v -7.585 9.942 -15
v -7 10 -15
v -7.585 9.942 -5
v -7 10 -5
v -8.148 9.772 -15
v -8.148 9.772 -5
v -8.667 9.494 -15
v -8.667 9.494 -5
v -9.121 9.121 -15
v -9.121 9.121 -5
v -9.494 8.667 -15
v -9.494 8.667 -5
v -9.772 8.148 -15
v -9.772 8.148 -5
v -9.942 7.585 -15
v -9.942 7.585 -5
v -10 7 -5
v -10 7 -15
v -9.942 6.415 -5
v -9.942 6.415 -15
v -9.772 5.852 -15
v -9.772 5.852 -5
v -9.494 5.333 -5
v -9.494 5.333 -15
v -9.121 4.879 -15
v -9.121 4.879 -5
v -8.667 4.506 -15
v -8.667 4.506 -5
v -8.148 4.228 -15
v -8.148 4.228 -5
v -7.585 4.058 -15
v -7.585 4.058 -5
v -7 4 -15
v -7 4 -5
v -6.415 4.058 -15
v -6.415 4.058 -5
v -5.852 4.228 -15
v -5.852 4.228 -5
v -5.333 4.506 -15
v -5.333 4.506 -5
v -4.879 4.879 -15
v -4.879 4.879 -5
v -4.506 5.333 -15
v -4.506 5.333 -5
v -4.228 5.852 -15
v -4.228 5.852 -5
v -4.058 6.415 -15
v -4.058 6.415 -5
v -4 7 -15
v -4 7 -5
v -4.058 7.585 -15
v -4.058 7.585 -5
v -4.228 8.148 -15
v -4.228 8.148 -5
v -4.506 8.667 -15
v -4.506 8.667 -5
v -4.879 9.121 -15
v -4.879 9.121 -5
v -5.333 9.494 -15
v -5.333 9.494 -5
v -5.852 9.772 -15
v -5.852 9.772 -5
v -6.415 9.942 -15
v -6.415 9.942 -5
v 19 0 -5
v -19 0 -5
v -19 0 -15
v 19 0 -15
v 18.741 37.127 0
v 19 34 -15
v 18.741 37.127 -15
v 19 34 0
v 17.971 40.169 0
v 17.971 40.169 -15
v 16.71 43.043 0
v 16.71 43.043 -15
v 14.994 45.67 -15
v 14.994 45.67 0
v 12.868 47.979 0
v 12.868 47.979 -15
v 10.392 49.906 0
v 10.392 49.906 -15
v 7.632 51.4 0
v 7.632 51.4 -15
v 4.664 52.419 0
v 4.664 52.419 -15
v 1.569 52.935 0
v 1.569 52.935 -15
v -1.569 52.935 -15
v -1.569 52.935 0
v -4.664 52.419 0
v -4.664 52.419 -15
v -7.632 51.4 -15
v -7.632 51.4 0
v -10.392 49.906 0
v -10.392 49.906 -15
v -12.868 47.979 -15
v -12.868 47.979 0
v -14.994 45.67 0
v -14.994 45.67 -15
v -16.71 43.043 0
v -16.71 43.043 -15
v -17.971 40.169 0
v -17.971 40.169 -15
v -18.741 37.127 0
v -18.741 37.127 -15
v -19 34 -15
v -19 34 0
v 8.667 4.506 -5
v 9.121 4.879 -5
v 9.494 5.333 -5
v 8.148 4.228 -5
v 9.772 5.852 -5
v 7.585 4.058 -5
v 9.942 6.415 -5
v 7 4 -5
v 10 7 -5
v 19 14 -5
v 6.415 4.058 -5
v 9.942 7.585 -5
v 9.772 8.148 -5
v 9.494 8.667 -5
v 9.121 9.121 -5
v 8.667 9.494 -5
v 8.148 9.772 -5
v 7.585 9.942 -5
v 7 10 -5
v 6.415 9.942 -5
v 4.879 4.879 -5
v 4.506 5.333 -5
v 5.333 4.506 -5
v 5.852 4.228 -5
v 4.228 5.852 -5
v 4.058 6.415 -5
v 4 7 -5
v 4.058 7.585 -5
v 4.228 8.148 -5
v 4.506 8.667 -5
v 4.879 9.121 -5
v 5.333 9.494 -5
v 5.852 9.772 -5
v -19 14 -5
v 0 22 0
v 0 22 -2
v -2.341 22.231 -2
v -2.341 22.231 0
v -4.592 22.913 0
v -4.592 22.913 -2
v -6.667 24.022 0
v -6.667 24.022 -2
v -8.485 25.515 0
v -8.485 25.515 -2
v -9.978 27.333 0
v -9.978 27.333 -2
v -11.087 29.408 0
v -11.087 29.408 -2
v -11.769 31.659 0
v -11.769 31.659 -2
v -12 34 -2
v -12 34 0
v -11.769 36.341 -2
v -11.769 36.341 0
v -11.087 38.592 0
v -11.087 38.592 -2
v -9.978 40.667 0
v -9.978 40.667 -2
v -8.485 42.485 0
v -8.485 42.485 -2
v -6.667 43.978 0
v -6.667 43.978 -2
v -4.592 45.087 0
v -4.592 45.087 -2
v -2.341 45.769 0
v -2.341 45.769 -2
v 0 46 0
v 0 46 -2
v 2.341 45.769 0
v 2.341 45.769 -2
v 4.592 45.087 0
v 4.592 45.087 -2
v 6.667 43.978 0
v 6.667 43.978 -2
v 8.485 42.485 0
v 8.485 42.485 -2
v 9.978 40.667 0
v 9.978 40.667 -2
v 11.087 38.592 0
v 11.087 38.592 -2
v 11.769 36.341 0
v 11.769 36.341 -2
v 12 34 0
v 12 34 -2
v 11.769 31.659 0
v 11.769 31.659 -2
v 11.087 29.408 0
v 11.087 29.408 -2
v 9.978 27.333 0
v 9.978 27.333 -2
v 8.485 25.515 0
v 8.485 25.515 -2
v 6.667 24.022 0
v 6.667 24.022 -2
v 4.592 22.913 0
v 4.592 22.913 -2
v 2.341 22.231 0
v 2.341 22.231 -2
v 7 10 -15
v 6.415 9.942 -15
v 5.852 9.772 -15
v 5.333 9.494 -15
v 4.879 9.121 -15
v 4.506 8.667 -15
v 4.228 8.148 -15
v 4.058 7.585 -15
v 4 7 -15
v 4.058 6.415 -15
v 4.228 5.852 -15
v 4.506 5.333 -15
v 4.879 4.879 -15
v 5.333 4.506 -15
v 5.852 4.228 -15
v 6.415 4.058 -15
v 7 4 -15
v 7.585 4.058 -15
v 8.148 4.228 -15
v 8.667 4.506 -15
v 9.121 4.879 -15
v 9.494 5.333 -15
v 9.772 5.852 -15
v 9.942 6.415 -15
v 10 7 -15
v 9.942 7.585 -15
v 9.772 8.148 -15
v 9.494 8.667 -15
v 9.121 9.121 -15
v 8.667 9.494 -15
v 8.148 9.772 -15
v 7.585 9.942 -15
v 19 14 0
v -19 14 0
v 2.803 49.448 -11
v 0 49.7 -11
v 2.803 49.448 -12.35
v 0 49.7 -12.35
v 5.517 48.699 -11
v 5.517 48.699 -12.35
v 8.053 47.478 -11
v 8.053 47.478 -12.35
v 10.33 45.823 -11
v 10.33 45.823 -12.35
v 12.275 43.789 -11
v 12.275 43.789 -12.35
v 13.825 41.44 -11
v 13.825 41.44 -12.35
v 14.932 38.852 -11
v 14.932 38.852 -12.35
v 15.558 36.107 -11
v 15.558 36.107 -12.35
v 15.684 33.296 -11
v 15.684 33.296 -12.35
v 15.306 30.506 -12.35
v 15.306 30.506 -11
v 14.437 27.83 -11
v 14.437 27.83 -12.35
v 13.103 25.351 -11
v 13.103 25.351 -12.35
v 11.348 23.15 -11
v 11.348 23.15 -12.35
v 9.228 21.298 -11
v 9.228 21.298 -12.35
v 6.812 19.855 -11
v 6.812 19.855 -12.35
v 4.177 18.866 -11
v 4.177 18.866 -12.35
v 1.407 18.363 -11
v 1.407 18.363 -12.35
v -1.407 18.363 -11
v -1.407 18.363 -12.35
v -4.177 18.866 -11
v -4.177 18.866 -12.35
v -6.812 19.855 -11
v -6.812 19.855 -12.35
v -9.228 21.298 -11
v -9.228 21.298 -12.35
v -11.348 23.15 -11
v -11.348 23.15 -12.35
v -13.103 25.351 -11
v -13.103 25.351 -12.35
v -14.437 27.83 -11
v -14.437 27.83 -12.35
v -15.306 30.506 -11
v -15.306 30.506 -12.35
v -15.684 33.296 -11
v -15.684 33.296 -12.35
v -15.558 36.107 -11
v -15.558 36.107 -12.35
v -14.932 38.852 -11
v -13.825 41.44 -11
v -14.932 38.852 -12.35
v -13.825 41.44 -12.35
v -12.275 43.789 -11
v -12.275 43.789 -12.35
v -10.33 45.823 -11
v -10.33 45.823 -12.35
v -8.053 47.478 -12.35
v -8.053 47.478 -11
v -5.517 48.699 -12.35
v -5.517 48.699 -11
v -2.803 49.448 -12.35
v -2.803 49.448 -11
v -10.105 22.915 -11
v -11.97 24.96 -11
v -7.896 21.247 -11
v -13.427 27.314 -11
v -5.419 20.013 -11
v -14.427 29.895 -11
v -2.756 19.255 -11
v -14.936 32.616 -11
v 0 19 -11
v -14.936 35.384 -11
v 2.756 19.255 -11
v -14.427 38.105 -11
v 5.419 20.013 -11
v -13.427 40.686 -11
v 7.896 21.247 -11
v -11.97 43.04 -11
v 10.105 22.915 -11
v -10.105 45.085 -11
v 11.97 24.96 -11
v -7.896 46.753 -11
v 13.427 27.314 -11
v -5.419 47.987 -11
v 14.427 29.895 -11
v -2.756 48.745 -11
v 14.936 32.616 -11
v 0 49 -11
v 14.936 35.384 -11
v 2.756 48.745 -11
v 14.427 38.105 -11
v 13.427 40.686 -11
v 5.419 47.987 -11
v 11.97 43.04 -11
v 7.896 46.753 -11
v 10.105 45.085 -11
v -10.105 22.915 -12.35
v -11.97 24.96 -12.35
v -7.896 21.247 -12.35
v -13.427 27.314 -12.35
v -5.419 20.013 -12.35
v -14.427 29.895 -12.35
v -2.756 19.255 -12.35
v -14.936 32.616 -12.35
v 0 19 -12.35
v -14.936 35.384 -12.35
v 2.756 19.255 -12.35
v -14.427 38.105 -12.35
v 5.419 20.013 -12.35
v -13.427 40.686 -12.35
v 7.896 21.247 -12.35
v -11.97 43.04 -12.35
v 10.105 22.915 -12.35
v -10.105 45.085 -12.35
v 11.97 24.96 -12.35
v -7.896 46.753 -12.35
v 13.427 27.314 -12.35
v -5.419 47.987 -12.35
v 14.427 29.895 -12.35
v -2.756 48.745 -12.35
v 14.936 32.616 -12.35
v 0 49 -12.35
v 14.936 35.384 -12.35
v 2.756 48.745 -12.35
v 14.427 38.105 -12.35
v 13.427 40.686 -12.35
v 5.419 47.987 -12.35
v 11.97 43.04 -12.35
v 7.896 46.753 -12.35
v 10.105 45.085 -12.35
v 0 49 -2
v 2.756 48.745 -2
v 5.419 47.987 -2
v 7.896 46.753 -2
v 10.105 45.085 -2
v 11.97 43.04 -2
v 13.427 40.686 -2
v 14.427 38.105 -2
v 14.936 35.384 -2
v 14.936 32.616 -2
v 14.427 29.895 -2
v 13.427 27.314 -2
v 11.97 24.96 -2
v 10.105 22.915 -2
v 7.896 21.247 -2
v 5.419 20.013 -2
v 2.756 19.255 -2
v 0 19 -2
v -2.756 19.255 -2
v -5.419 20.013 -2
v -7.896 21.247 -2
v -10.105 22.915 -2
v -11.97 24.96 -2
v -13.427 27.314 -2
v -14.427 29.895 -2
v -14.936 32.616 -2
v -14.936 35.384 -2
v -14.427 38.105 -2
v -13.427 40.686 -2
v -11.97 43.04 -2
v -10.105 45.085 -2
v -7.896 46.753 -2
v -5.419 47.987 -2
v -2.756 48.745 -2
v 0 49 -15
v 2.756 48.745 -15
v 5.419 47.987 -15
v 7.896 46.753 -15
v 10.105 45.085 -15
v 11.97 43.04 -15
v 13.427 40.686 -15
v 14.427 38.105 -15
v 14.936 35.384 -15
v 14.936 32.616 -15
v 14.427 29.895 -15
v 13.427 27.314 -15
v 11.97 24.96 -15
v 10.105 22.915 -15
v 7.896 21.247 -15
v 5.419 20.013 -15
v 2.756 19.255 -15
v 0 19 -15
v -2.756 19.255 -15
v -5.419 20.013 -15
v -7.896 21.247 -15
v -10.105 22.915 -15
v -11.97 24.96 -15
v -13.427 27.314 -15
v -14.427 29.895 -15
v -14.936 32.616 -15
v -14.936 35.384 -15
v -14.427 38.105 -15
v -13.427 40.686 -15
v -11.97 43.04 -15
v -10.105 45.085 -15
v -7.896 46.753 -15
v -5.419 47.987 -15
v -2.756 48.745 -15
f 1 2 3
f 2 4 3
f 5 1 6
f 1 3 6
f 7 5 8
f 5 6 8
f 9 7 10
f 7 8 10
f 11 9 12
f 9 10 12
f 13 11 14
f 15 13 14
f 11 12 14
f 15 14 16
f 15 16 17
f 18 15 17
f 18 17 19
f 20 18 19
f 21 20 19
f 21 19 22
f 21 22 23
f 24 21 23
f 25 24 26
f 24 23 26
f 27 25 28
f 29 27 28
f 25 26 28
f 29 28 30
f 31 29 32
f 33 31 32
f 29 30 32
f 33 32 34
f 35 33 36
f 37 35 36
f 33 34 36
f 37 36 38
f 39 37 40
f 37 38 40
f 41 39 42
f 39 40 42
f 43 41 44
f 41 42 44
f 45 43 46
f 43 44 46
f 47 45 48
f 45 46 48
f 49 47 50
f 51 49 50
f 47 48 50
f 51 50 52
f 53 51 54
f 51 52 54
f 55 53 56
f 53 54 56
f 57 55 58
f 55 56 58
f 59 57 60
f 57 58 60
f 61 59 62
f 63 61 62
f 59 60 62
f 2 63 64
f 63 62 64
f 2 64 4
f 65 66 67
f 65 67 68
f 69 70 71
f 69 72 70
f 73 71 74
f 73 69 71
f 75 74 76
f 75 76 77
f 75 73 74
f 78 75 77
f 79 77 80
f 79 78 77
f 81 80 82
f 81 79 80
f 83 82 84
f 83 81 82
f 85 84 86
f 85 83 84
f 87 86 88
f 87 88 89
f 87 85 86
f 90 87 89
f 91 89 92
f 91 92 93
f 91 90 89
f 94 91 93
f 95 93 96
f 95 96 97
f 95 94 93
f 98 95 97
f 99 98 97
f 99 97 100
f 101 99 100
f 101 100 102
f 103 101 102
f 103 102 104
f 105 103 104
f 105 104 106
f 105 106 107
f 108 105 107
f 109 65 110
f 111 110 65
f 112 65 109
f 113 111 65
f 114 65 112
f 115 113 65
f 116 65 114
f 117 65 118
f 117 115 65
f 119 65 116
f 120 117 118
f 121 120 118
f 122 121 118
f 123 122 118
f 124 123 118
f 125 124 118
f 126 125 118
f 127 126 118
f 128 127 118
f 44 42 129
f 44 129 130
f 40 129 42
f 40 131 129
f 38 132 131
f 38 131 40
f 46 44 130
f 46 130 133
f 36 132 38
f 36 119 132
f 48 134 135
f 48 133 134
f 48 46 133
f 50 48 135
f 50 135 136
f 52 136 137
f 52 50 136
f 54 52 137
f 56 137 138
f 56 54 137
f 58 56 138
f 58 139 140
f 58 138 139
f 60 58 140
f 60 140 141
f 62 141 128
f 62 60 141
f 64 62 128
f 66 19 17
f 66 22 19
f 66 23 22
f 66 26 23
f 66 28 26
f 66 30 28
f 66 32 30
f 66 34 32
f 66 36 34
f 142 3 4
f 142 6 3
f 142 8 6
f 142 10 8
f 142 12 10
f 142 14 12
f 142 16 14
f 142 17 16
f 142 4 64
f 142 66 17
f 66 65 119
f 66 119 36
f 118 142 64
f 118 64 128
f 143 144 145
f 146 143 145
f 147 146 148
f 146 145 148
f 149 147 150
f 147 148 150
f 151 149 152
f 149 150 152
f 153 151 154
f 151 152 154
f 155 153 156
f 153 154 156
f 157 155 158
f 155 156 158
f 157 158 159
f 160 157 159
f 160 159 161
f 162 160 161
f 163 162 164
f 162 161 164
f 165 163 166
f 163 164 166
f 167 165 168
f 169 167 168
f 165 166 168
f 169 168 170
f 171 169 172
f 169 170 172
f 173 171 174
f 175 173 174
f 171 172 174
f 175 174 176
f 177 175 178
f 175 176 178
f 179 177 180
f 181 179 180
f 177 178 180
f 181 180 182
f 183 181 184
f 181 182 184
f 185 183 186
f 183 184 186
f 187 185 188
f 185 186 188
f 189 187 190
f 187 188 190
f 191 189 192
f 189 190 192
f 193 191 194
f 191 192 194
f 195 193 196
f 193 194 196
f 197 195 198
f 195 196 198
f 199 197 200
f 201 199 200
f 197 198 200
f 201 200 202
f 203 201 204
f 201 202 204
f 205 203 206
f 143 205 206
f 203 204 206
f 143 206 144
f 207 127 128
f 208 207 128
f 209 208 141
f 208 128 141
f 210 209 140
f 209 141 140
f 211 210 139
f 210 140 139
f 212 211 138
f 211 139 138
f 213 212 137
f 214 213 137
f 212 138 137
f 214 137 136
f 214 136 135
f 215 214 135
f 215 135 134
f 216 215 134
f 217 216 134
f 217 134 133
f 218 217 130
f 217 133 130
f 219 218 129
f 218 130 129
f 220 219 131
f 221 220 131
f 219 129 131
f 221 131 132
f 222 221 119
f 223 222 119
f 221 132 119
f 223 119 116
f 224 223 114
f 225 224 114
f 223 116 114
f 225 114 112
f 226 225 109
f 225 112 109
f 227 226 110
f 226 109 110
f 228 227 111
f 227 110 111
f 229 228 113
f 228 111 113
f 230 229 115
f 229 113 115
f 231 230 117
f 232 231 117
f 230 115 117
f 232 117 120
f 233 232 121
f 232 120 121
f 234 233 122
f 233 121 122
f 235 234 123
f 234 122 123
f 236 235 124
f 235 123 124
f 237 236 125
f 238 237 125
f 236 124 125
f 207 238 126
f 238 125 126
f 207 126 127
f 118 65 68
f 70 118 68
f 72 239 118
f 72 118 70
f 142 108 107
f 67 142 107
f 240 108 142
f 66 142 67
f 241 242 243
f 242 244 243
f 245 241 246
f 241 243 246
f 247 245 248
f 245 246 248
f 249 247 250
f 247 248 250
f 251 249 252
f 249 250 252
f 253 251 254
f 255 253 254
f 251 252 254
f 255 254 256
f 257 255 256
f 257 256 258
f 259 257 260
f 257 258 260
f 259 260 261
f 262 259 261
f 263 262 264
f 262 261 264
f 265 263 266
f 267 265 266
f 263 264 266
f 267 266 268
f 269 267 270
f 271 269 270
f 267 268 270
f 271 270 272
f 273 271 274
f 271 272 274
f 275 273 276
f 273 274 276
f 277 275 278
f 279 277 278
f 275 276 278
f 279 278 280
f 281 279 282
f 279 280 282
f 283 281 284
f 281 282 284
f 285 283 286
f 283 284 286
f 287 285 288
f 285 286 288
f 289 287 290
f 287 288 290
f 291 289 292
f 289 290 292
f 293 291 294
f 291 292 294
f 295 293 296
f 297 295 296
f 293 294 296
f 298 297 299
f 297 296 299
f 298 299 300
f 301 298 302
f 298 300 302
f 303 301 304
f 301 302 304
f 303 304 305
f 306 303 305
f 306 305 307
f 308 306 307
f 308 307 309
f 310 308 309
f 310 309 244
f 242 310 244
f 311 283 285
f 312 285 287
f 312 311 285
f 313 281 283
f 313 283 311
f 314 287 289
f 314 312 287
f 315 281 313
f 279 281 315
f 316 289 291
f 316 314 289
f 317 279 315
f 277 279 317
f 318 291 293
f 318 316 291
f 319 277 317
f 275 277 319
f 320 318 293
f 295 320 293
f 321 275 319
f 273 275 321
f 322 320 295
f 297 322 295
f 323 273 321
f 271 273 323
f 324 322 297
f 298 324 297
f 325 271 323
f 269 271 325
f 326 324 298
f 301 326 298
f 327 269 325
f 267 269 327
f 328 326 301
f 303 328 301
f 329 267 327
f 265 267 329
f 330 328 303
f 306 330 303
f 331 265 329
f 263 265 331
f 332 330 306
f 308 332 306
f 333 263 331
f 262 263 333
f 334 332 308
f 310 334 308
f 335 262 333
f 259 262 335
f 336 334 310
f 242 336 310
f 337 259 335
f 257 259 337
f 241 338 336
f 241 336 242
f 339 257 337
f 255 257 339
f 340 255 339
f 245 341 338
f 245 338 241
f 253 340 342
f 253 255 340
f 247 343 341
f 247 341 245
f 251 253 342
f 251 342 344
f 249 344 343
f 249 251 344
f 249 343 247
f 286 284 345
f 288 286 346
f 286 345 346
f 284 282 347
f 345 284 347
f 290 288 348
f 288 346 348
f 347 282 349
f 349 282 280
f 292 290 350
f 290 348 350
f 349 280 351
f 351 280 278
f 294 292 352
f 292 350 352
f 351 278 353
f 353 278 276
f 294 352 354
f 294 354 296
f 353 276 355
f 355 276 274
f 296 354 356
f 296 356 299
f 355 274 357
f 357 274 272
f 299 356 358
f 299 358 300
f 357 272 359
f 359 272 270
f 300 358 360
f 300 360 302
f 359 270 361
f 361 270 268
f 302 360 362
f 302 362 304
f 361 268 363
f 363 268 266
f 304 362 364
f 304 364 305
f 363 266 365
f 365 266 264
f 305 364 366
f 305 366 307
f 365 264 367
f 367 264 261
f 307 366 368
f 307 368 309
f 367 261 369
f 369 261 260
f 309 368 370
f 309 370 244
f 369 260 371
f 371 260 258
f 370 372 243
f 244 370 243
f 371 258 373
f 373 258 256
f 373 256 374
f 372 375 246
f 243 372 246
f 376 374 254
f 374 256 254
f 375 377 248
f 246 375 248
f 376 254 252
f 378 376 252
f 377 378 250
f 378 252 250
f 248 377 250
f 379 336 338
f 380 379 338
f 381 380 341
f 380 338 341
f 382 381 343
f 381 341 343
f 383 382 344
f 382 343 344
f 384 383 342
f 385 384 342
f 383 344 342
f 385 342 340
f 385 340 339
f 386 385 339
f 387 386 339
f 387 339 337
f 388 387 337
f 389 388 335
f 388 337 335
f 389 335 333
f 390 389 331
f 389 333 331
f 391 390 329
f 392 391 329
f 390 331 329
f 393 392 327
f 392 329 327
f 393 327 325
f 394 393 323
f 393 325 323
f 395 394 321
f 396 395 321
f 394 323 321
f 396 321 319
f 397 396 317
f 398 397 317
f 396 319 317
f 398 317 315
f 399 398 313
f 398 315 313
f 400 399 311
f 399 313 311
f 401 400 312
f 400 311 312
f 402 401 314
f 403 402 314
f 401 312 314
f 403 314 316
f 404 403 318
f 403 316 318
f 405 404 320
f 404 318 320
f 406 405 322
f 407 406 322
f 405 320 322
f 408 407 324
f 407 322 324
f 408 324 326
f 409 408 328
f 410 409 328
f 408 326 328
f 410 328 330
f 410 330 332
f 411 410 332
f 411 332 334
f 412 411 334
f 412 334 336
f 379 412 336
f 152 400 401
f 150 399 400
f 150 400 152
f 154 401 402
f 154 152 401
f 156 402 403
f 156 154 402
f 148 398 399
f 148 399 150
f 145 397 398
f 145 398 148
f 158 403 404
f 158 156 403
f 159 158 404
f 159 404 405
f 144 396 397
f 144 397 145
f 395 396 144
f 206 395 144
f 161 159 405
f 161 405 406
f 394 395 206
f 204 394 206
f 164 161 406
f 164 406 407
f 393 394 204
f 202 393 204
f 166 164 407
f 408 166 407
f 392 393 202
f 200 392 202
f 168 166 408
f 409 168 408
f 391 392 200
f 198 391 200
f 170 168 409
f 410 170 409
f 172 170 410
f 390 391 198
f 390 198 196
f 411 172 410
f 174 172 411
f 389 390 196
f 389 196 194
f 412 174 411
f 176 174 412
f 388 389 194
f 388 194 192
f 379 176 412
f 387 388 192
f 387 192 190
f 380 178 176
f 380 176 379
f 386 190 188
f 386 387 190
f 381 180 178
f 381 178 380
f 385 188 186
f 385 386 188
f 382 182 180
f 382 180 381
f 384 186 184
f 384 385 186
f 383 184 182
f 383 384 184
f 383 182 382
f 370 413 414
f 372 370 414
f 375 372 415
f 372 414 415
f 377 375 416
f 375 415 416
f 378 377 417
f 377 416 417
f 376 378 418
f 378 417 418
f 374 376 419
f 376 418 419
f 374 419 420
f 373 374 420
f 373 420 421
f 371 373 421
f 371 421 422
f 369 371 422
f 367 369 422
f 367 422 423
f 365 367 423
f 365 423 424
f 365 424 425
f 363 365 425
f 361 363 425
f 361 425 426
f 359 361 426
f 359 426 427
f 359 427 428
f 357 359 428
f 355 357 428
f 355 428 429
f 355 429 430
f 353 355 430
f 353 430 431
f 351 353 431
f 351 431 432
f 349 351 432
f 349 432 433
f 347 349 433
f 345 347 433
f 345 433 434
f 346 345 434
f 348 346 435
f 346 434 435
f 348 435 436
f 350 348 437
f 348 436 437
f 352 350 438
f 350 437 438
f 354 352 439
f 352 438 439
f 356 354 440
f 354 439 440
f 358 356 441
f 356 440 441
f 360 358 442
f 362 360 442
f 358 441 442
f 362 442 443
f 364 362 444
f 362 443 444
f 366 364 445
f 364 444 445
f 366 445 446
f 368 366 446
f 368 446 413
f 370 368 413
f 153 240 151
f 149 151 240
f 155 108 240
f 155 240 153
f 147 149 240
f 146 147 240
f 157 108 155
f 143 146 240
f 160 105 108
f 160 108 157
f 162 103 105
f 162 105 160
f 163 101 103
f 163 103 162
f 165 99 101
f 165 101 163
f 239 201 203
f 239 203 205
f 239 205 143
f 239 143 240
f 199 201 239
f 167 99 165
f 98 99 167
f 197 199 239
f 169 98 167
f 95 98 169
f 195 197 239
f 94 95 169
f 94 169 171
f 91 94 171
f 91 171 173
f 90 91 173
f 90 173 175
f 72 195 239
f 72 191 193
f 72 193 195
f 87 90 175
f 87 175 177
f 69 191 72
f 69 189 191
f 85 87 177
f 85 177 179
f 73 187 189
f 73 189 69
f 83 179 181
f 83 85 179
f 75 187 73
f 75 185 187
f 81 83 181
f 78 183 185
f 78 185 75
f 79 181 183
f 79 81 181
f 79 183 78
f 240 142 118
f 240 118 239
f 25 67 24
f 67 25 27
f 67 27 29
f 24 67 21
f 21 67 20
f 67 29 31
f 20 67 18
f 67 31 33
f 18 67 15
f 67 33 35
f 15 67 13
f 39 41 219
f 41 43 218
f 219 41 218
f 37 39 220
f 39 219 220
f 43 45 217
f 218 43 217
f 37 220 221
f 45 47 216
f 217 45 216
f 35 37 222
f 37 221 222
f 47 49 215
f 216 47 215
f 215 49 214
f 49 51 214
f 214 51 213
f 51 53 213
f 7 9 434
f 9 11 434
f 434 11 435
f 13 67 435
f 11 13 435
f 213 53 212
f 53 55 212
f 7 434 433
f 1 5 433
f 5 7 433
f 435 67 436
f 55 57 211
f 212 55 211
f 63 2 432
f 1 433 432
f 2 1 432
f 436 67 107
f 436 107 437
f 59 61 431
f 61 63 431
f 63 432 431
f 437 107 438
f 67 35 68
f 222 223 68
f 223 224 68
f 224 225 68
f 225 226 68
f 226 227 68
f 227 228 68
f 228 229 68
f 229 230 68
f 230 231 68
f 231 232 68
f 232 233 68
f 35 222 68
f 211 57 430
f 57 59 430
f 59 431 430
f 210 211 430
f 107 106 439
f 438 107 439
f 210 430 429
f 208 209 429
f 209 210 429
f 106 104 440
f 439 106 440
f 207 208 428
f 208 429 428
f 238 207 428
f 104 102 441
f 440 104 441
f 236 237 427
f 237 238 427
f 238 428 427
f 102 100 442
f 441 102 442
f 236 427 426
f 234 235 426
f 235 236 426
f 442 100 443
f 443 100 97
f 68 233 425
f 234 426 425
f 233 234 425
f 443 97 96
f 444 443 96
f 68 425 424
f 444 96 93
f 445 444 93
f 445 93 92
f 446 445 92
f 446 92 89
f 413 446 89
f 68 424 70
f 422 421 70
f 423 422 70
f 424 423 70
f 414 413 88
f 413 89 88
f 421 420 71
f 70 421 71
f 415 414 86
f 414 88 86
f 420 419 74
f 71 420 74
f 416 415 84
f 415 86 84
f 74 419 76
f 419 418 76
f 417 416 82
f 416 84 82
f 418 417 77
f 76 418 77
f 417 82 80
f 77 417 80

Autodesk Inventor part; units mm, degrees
sketch "Sketch_9" plane through (0, 0, 0) normal (0, 0, 1) x (1, 0, 0)
  line L0 (-19, 34) -> (-19, 0)
  line L1 (-19, 0) -> (19, 0)
  line L2 (19, 0) -> (19, 34)
  arc A0 (19, 34) -> (-19, 34) centre (0, 34) ccw
extrude "Extrusion1" add sketch "Sketch_9" against normal blind 15
sketch "Sketch_1" plane through (0, 0, 0) normal (1, 0, 0) x (0, 0, -1)
  line L0 (0, 14) -> (0, 0)
  line L1 (0, 0) -> (5, 0)
  line L2 (5, 0) -> (5, 14)
  line L3 (5, 14) -> (0, 14)
extrude "Extrusion2" cut sketch "Sketch_1" along normal mid plane 76
sketch "Sketch_2" plane through (0, 0, 0) normal (1, 0, 0) x (0, 0, -1)
  line L0 (15, 34) -> (2, 34)
  line L1 (2, 34) -> (2, 49)
  line L2 (2, 49) -> (11, 49)
  line L3 (11, 49) -> (11, 49.7)
  line L4 (11, 49.7) -> (12.35, 49.7)
  line L5 (12.35, 49.7) -> (12.35, 49)
  line L6 (12.35, 49) -> (15, 49)
  line L7 (15, 49) -> (15, 34)
  line L8 (15, 34) -> (2, 34)
revolve "Revolution1" cut sketch "Sketch_2" angle 360 about axis through (0, 34, -15) along (0, 0, -1)
sketch "Sketch4" plane through (0, 0, 0) normal (0, 0, 1) x (1, 0, 0)
  point P0 (0, 34)
hole "Hole1" at (0, 34, 0) direction (0, 0, -1) diameter 24 depth 15
sketch "Sketch5" plane through (0, 0, -15) normal (0, 0, -1) x (-1, 0, 0)
  point P0 (7, 7)
hole "Hole2" at (-7, 7, -15) direction (0, 0, 1) diameter 6 depth 15
pattern_linear "Rectangular Pattern1" count 2 spacing 14 along (1, 0, 0) of "Hole2"
ref_plane "to_bearing_XY" through (0, 34, -6.5) normal (0, 0, -1) x (1, 0, 0)
ref_plane "to_bearing_YZ" through (0, 34, -6.5) normal (1, 0, 0) x (0, -1, 0)
ref_plane "to_bearing_ZX" through (0, 34, -6.5) normal (0, -1, 0) x (0, 0, -1)
ref_plane "to_retaining_ring_XY" through (0, 34, -11) normal (0, 0, 1) x (-1, 0, 0)
ref_plane "to_retaining_ring_YZ" through (0, 34, -11) normal (-1, 0, 0) x (0, -1, 0)
ref_plane "to_retaining_ring_ZX" through (0, 34, -11) normal (0, -1, 0) x (0, 0, 1)
properties part number "SBGSNA6200ZZ-20_h"
